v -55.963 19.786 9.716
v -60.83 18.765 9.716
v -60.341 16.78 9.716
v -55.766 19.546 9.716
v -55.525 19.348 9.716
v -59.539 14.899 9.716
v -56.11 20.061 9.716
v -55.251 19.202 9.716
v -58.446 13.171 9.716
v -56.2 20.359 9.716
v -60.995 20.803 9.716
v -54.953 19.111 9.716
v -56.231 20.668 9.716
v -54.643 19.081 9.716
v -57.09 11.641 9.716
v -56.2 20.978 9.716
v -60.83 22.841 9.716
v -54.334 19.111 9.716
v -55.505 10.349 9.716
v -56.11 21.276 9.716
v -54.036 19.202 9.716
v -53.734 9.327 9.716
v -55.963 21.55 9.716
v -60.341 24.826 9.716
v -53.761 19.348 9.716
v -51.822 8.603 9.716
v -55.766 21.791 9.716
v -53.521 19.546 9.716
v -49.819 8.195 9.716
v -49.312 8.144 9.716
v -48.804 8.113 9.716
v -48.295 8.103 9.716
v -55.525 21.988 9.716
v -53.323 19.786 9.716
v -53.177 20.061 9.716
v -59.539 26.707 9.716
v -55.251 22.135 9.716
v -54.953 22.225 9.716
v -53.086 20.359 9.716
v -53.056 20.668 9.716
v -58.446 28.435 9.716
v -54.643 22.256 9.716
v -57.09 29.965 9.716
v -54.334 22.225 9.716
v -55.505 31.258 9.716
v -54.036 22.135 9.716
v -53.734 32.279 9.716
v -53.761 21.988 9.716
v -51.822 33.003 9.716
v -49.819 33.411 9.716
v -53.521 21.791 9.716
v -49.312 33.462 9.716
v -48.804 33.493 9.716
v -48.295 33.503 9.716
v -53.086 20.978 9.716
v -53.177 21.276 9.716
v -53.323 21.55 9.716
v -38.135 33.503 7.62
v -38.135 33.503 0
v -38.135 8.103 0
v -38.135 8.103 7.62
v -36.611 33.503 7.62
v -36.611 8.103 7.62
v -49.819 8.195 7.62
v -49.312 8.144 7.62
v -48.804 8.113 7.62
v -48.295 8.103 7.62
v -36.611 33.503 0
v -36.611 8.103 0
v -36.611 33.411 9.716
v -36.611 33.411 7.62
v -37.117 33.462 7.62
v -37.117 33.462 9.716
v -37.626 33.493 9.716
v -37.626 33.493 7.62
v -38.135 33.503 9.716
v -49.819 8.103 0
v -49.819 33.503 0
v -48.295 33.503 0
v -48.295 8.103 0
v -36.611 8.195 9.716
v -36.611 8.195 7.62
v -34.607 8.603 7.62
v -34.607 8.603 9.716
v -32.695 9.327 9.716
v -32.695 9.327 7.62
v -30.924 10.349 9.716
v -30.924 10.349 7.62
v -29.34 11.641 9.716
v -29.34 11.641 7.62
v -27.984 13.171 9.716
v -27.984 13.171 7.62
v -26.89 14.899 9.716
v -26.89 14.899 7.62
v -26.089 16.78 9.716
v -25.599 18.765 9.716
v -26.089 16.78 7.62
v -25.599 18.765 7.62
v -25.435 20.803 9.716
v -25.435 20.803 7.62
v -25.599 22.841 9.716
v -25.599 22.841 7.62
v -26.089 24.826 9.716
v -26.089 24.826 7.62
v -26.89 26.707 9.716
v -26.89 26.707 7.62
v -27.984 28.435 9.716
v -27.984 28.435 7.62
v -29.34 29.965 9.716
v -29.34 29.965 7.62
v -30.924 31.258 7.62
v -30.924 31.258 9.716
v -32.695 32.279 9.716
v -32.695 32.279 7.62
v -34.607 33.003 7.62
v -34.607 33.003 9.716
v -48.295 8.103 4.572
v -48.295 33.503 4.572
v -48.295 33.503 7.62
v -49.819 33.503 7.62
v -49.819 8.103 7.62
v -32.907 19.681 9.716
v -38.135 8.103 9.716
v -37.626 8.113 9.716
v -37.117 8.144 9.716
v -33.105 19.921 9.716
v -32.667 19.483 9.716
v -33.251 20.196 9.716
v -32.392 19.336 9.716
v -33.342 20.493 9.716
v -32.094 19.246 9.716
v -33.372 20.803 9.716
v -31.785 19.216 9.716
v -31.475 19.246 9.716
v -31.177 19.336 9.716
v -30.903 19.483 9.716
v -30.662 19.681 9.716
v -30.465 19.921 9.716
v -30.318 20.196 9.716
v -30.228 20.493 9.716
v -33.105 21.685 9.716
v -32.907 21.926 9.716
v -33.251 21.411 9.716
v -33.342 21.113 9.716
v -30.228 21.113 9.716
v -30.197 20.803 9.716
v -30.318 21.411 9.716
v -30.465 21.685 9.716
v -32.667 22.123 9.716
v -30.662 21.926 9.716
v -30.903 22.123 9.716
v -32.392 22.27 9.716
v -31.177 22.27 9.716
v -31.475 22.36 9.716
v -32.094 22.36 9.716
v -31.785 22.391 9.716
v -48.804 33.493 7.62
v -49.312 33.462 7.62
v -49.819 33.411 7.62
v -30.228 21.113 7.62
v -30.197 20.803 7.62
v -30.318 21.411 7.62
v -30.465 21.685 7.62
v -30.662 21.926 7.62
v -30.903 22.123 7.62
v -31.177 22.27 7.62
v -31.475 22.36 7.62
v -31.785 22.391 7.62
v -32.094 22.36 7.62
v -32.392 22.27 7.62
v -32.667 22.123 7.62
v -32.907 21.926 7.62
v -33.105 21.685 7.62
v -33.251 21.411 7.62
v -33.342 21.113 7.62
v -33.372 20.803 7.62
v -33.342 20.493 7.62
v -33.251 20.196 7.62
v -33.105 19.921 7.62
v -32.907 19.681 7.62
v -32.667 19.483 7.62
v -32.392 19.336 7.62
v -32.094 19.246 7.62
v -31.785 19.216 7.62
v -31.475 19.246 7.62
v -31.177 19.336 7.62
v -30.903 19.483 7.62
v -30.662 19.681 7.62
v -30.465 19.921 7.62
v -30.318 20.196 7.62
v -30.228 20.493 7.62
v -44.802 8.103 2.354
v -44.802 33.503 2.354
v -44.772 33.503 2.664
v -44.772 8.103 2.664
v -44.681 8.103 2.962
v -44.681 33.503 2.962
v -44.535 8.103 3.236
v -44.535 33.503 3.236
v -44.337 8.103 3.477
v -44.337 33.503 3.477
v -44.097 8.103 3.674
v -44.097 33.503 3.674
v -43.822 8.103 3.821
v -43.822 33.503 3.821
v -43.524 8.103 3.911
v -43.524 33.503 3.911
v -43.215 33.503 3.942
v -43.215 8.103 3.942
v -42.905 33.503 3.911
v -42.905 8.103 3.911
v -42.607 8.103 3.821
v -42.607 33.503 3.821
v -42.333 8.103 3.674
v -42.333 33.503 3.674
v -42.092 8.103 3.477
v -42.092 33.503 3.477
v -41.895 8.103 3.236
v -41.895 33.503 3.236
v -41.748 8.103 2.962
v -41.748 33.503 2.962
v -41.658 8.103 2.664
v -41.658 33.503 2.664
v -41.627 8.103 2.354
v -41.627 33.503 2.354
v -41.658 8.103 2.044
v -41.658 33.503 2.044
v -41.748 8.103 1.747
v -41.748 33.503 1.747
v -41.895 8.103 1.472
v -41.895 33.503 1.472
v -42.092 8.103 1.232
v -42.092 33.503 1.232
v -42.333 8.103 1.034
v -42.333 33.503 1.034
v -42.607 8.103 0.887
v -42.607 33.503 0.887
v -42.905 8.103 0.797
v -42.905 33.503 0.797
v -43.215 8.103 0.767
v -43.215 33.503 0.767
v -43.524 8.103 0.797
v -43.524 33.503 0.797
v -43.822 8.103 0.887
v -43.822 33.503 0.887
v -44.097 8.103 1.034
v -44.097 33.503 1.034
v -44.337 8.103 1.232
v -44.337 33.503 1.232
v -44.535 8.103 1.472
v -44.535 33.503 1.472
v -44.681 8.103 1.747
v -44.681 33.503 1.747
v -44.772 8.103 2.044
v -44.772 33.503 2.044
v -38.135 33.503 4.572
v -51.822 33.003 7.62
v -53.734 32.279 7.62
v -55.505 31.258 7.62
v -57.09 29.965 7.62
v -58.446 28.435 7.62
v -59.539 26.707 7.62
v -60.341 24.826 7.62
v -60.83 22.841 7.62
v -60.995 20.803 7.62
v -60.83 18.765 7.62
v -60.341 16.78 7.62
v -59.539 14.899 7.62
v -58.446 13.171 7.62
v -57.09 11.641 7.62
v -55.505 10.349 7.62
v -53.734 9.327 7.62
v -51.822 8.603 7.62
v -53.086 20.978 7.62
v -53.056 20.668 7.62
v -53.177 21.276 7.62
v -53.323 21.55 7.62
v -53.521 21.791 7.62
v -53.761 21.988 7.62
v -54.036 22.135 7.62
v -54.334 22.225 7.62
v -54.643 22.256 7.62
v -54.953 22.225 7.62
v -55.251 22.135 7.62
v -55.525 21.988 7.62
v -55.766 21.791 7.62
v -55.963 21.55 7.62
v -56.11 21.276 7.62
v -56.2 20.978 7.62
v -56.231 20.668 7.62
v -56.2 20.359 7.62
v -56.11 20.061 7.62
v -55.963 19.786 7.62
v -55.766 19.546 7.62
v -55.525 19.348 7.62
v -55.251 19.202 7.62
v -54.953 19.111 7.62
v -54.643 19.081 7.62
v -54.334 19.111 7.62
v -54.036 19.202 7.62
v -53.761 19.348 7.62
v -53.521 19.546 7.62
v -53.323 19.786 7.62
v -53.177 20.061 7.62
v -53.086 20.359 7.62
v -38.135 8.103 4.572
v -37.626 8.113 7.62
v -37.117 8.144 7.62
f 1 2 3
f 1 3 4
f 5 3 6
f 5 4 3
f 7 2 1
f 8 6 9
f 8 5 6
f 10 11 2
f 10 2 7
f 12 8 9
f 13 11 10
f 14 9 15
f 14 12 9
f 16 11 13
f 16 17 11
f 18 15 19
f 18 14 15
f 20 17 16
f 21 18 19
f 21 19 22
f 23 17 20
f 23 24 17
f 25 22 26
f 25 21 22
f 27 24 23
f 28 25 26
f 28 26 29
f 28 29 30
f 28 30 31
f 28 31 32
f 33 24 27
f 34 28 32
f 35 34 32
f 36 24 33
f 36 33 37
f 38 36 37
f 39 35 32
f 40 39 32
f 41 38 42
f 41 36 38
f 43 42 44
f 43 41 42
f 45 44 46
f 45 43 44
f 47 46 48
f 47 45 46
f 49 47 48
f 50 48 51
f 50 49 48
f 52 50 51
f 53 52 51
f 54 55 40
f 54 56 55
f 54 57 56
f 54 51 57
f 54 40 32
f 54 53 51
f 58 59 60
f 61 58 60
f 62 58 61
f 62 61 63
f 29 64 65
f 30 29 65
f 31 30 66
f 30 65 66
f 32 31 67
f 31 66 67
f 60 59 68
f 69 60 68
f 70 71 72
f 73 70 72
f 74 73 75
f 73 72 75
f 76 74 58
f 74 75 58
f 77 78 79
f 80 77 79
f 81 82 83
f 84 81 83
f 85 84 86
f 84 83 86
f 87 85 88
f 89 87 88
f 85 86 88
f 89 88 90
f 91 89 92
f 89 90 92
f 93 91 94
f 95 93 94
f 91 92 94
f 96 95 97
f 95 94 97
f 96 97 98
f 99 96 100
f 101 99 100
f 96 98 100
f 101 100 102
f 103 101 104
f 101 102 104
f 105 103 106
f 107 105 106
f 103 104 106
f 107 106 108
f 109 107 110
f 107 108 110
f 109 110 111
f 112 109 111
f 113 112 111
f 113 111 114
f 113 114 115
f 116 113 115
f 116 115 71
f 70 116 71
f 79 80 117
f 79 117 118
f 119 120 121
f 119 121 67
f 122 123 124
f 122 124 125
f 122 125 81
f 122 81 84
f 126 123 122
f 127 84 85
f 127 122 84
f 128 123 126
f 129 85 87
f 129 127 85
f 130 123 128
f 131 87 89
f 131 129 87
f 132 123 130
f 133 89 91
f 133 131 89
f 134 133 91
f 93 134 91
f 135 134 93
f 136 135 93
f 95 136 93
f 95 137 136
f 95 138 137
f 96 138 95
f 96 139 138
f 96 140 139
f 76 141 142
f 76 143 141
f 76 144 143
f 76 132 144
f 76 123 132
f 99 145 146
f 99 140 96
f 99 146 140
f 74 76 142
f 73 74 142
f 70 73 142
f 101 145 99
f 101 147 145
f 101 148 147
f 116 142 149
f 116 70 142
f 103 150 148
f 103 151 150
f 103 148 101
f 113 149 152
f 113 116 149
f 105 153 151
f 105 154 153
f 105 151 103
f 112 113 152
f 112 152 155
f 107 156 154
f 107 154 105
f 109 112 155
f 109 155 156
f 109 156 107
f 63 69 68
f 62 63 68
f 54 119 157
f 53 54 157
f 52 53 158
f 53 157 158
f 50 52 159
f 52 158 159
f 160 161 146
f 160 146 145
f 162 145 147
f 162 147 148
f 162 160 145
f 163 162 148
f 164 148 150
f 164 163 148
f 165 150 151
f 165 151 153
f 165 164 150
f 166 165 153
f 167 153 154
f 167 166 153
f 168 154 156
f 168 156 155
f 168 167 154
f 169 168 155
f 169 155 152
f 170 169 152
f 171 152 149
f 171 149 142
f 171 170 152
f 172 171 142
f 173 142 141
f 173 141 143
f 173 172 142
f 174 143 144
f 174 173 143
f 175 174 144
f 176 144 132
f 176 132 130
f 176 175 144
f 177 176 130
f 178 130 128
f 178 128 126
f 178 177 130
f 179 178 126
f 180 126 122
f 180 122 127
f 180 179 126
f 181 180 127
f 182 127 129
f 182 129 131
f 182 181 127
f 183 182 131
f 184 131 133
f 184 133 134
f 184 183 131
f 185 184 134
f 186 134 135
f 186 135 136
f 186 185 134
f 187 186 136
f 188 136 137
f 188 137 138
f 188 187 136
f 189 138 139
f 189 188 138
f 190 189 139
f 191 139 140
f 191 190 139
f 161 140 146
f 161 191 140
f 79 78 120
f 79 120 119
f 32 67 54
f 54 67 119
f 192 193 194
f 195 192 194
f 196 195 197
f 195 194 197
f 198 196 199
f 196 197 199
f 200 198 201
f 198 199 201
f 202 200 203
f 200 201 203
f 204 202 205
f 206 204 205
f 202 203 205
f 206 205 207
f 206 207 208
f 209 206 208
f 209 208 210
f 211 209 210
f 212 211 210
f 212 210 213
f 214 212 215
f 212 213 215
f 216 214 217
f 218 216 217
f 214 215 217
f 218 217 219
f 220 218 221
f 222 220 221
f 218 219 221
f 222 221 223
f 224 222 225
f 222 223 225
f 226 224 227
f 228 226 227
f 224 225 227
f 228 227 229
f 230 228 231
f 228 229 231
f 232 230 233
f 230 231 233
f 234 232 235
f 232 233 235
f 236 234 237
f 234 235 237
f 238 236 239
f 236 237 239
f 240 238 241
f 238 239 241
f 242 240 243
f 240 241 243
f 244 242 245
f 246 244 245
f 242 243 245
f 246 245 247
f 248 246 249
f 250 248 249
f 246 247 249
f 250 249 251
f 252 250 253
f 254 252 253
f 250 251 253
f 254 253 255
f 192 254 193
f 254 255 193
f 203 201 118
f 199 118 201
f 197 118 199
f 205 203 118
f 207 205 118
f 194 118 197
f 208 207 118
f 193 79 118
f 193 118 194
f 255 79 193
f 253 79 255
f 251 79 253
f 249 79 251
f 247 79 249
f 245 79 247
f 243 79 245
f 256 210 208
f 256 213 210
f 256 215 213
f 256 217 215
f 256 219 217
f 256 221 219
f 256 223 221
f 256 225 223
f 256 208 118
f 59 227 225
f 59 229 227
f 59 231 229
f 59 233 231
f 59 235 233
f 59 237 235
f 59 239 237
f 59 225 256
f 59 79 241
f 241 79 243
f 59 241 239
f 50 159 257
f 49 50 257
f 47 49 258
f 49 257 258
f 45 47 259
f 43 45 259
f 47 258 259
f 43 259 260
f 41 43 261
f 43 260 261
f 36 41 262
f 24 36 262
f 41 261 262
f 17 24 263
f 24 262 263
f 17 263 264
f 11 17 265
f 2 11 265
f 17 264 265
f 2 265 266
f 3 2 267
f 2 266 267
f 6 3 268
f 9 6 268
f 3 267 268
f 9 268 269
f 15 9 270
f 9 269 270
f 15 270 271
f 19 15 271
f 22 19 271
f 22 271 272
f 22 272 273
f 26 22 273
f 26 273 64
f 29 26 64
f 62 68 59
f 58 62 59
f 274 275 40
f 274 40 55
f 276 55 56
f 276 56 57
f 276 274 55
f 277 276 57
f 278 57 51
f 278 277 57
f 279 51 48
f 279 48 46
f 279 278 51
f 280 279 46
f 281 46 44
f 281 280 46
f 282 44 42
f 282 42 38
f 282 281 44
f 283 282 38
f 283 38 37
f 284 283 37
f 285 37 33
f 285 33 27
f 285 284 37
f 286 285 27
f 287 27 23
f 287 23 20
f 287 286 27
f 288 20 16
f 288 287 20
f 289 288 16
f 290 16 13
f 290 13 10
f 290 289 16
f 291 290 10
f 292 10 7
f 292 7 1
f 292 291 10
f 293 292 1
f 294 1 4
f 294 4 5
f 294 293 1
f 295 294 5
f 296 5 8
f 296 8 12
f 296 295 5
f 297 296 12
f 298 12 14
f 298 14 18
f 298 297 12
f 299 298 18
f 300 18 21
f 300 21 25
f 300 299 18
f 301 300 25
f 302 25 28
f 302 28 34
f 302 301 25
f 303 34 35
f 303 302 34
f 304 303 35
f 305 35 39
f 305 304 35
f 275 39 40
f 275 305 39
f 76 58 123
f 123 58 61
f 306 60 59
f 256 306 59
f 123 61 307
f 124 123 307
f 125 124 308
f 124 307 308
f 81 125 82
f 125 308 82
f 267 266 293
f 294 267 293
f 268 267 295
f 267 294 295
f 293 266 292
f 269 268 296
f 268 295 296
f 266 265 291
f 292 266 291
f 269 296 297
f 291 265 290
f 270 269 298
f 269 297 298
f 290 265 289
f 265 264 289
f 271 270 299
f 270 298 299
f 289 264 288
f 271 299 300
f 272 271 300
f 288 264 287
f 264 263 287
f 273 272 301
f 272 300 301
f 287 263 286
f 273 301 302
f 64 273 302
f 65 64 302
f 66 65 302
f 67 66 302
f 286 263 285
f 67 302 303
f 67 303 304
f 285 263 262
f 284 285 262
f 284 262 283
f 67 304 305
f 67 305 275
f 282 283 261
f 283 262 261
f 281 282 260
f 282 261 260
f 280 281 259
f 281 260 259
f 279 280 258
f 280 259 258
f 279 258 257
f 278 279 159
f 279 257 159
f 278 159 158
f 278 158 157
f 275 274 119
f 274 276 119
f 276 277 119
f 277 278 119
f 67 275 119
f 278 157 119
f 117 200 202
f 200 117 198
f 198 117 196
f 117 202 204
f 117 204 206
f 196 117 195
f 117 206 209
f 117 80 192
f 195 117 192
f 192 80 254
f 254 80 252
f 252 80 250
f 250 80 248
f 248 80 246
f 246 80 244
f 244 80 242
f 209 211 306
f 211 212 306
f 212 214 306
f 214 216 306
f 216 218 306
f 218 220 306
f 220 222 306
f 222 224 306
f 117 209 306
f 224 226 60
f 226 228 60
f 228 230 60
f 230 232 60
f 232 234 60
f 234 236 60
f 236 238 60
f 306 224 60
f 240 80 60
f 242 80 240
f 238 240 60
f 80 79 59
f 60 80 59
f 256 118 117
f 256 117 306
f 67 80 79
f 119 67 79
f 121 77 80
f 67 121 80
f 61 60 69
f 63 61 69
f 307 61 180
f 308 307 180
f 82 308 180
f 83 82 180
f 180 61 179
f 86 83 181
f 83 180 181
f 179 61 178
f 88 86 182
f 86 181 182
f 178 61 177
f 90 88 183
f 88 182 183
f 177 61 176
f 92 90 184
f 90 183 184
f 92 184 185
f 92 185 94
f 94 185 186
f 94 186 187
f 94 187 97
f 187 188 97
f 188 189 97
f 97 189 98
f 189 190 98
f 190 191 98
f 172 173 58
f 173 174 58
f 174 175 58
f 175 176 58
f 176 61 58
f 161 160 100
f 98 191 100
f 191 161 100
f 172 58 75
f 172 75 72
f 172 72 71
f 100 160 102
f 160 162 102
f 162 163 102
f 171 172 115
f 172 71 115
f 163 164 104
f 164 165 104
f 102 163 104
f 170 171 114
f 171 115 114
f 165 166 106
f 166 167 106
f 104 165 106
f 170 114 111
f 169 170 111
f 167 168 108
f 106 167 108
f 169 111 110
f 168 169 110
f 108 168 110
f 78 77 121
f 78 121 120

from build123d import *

# Parameters (mm, degrees)
F0_W     = 10.16
F0_H     = 25.4
F2_DEPTH = 4.572
F3_DEPTH = 7.62
F0_W_2   = 1.524
F4_R     = 1.5875
F6_DEPTH = 2.0955
F5_R     = 1.5875
F7_DEPTH = 2.0955
F8_R     = 1.5875
F9_DEPTH = 25.4


with BuildPart() as f2:
    # F0 (on Top) → F2 (new body)
    with BuildSketch(Plane.XY):
        with Locations((-43.2146790205, 20.8031578178)):
            Rectangle(F0_W, F0_H)
    extrude(amount=F2_DEPTH)

    # F8 (on face) → F9 (cut)
    with BuildSketch(Plane(origin=(0, 33.5031578178, 0), x_dir=(-1, 0, 0), z_dir=(0, 1, 0))):
        with Locations((43.2146790205, 2.3540838305)):
            Circle(F8_R)
    extrude(amount=-F9_DEPTH, mode=Mode.SUBTRACT)


with BuildPart() as f3:
    # F0 (on Top) → F3 (new body)
    with BuildSketch(Plane.XY):
        Polygon((-36.6106790205, 33.5031578178), (-38.1346790205, 33.5031578178), (-38.1346790205, 8.1031578178), (-38.0330790205, 8.1031578178), (-36.6106790205, 8.1031578178), align=None)
    extrude(amount=F3_DEPTH)


with BuildPart() as f3b:
    # F0 (on Top) → F3, piece 2 (new body)
    with BuildSketch(Plane.XY):
        with Locations((-49.0566790205, 20.8031578178)):
            Rectangle(F0_W_2, F0_H)
    extrude(amount=F3_DEPTH)


with BuildPart() as f6:
    # F4 (on face) → F6 (new body)
    with BuildSketch(Plane.XY.offset(7.62)):
        with BuildLine():
            Line((-48.2946790205, 8.1031578178), (-48.2946790205, 33.5031578178))
            ThreePointArc((-48.2946790205, 33.5031578178), (-49.0580593356, 33.4801941629), (-49.8186790205, 33.4113862422))
            Line((-49.8186790205, 33.4113862422), (-49.8186790205, 8.1949293935))
            ThreePointArc((-49.8186790205, 8.1949293935), (-49.0580593356, 8.1261214728), (-48.2946790205, 8.1031578178))
        make_face()
        with BuildLine():
            Line((-49.8186790205, 8.1949293935), (-49.8186790205, 33.4113862422))
            ThreePointArc((-49.8186790205, 33.4113862422), (-60.9946790205, 20.8031578178), (-49.8186790205, 8.1949293935))
        make_face()
        with Locations((-54.6432473904, 20.6683258789)):
            Circle(F4_R, mode=Mode.SUBTRACT)
    extrude(amount=F6_DEPTH)


with BuildPart() as f7:
    # F5 (on face) → F7 (new body)
    with BuildSketch(Plane.XY.offset(7.62)):
        with BuildLine():
            Line((-38.1346790205, 33.5031578178), (-38.1346790205, 8.1031578178))
            ThreePointArc((-38.1346790205, 8.1031578178), (-37.3712987053, 8.1261214728), (-36.6106790205, 8.1949293935))
            Line((-36.6106790205, 8.1949293935), (-36.6106790205, 33.4113862422))
            ThreePointArc((-36.6106790205, 33.4113862422), (-37.3712987053, 33.4801941629), (-38.1346790205, 33.5031578178))
        make_face()
        with BuildLine():
            Line((-36.6106790205, 33.4113862422), (-36.6106790205, 8.1949293935))
            ThreePointArc((-36.6106790205, 8.1949293935), (-25.4346790205, 20.8031578178), (-36.6106790205, 33.4113862422))
        make_face()
        with Locations((-31.7846790205, 20.8031578178)):
            Circle(F5_R, mode=Mode.SUBTRACT)
    extrude(amount=F7_DEPTH)


solid = Compound([f2.part, f3.part, f3b.part, f6.part, f7.part])
